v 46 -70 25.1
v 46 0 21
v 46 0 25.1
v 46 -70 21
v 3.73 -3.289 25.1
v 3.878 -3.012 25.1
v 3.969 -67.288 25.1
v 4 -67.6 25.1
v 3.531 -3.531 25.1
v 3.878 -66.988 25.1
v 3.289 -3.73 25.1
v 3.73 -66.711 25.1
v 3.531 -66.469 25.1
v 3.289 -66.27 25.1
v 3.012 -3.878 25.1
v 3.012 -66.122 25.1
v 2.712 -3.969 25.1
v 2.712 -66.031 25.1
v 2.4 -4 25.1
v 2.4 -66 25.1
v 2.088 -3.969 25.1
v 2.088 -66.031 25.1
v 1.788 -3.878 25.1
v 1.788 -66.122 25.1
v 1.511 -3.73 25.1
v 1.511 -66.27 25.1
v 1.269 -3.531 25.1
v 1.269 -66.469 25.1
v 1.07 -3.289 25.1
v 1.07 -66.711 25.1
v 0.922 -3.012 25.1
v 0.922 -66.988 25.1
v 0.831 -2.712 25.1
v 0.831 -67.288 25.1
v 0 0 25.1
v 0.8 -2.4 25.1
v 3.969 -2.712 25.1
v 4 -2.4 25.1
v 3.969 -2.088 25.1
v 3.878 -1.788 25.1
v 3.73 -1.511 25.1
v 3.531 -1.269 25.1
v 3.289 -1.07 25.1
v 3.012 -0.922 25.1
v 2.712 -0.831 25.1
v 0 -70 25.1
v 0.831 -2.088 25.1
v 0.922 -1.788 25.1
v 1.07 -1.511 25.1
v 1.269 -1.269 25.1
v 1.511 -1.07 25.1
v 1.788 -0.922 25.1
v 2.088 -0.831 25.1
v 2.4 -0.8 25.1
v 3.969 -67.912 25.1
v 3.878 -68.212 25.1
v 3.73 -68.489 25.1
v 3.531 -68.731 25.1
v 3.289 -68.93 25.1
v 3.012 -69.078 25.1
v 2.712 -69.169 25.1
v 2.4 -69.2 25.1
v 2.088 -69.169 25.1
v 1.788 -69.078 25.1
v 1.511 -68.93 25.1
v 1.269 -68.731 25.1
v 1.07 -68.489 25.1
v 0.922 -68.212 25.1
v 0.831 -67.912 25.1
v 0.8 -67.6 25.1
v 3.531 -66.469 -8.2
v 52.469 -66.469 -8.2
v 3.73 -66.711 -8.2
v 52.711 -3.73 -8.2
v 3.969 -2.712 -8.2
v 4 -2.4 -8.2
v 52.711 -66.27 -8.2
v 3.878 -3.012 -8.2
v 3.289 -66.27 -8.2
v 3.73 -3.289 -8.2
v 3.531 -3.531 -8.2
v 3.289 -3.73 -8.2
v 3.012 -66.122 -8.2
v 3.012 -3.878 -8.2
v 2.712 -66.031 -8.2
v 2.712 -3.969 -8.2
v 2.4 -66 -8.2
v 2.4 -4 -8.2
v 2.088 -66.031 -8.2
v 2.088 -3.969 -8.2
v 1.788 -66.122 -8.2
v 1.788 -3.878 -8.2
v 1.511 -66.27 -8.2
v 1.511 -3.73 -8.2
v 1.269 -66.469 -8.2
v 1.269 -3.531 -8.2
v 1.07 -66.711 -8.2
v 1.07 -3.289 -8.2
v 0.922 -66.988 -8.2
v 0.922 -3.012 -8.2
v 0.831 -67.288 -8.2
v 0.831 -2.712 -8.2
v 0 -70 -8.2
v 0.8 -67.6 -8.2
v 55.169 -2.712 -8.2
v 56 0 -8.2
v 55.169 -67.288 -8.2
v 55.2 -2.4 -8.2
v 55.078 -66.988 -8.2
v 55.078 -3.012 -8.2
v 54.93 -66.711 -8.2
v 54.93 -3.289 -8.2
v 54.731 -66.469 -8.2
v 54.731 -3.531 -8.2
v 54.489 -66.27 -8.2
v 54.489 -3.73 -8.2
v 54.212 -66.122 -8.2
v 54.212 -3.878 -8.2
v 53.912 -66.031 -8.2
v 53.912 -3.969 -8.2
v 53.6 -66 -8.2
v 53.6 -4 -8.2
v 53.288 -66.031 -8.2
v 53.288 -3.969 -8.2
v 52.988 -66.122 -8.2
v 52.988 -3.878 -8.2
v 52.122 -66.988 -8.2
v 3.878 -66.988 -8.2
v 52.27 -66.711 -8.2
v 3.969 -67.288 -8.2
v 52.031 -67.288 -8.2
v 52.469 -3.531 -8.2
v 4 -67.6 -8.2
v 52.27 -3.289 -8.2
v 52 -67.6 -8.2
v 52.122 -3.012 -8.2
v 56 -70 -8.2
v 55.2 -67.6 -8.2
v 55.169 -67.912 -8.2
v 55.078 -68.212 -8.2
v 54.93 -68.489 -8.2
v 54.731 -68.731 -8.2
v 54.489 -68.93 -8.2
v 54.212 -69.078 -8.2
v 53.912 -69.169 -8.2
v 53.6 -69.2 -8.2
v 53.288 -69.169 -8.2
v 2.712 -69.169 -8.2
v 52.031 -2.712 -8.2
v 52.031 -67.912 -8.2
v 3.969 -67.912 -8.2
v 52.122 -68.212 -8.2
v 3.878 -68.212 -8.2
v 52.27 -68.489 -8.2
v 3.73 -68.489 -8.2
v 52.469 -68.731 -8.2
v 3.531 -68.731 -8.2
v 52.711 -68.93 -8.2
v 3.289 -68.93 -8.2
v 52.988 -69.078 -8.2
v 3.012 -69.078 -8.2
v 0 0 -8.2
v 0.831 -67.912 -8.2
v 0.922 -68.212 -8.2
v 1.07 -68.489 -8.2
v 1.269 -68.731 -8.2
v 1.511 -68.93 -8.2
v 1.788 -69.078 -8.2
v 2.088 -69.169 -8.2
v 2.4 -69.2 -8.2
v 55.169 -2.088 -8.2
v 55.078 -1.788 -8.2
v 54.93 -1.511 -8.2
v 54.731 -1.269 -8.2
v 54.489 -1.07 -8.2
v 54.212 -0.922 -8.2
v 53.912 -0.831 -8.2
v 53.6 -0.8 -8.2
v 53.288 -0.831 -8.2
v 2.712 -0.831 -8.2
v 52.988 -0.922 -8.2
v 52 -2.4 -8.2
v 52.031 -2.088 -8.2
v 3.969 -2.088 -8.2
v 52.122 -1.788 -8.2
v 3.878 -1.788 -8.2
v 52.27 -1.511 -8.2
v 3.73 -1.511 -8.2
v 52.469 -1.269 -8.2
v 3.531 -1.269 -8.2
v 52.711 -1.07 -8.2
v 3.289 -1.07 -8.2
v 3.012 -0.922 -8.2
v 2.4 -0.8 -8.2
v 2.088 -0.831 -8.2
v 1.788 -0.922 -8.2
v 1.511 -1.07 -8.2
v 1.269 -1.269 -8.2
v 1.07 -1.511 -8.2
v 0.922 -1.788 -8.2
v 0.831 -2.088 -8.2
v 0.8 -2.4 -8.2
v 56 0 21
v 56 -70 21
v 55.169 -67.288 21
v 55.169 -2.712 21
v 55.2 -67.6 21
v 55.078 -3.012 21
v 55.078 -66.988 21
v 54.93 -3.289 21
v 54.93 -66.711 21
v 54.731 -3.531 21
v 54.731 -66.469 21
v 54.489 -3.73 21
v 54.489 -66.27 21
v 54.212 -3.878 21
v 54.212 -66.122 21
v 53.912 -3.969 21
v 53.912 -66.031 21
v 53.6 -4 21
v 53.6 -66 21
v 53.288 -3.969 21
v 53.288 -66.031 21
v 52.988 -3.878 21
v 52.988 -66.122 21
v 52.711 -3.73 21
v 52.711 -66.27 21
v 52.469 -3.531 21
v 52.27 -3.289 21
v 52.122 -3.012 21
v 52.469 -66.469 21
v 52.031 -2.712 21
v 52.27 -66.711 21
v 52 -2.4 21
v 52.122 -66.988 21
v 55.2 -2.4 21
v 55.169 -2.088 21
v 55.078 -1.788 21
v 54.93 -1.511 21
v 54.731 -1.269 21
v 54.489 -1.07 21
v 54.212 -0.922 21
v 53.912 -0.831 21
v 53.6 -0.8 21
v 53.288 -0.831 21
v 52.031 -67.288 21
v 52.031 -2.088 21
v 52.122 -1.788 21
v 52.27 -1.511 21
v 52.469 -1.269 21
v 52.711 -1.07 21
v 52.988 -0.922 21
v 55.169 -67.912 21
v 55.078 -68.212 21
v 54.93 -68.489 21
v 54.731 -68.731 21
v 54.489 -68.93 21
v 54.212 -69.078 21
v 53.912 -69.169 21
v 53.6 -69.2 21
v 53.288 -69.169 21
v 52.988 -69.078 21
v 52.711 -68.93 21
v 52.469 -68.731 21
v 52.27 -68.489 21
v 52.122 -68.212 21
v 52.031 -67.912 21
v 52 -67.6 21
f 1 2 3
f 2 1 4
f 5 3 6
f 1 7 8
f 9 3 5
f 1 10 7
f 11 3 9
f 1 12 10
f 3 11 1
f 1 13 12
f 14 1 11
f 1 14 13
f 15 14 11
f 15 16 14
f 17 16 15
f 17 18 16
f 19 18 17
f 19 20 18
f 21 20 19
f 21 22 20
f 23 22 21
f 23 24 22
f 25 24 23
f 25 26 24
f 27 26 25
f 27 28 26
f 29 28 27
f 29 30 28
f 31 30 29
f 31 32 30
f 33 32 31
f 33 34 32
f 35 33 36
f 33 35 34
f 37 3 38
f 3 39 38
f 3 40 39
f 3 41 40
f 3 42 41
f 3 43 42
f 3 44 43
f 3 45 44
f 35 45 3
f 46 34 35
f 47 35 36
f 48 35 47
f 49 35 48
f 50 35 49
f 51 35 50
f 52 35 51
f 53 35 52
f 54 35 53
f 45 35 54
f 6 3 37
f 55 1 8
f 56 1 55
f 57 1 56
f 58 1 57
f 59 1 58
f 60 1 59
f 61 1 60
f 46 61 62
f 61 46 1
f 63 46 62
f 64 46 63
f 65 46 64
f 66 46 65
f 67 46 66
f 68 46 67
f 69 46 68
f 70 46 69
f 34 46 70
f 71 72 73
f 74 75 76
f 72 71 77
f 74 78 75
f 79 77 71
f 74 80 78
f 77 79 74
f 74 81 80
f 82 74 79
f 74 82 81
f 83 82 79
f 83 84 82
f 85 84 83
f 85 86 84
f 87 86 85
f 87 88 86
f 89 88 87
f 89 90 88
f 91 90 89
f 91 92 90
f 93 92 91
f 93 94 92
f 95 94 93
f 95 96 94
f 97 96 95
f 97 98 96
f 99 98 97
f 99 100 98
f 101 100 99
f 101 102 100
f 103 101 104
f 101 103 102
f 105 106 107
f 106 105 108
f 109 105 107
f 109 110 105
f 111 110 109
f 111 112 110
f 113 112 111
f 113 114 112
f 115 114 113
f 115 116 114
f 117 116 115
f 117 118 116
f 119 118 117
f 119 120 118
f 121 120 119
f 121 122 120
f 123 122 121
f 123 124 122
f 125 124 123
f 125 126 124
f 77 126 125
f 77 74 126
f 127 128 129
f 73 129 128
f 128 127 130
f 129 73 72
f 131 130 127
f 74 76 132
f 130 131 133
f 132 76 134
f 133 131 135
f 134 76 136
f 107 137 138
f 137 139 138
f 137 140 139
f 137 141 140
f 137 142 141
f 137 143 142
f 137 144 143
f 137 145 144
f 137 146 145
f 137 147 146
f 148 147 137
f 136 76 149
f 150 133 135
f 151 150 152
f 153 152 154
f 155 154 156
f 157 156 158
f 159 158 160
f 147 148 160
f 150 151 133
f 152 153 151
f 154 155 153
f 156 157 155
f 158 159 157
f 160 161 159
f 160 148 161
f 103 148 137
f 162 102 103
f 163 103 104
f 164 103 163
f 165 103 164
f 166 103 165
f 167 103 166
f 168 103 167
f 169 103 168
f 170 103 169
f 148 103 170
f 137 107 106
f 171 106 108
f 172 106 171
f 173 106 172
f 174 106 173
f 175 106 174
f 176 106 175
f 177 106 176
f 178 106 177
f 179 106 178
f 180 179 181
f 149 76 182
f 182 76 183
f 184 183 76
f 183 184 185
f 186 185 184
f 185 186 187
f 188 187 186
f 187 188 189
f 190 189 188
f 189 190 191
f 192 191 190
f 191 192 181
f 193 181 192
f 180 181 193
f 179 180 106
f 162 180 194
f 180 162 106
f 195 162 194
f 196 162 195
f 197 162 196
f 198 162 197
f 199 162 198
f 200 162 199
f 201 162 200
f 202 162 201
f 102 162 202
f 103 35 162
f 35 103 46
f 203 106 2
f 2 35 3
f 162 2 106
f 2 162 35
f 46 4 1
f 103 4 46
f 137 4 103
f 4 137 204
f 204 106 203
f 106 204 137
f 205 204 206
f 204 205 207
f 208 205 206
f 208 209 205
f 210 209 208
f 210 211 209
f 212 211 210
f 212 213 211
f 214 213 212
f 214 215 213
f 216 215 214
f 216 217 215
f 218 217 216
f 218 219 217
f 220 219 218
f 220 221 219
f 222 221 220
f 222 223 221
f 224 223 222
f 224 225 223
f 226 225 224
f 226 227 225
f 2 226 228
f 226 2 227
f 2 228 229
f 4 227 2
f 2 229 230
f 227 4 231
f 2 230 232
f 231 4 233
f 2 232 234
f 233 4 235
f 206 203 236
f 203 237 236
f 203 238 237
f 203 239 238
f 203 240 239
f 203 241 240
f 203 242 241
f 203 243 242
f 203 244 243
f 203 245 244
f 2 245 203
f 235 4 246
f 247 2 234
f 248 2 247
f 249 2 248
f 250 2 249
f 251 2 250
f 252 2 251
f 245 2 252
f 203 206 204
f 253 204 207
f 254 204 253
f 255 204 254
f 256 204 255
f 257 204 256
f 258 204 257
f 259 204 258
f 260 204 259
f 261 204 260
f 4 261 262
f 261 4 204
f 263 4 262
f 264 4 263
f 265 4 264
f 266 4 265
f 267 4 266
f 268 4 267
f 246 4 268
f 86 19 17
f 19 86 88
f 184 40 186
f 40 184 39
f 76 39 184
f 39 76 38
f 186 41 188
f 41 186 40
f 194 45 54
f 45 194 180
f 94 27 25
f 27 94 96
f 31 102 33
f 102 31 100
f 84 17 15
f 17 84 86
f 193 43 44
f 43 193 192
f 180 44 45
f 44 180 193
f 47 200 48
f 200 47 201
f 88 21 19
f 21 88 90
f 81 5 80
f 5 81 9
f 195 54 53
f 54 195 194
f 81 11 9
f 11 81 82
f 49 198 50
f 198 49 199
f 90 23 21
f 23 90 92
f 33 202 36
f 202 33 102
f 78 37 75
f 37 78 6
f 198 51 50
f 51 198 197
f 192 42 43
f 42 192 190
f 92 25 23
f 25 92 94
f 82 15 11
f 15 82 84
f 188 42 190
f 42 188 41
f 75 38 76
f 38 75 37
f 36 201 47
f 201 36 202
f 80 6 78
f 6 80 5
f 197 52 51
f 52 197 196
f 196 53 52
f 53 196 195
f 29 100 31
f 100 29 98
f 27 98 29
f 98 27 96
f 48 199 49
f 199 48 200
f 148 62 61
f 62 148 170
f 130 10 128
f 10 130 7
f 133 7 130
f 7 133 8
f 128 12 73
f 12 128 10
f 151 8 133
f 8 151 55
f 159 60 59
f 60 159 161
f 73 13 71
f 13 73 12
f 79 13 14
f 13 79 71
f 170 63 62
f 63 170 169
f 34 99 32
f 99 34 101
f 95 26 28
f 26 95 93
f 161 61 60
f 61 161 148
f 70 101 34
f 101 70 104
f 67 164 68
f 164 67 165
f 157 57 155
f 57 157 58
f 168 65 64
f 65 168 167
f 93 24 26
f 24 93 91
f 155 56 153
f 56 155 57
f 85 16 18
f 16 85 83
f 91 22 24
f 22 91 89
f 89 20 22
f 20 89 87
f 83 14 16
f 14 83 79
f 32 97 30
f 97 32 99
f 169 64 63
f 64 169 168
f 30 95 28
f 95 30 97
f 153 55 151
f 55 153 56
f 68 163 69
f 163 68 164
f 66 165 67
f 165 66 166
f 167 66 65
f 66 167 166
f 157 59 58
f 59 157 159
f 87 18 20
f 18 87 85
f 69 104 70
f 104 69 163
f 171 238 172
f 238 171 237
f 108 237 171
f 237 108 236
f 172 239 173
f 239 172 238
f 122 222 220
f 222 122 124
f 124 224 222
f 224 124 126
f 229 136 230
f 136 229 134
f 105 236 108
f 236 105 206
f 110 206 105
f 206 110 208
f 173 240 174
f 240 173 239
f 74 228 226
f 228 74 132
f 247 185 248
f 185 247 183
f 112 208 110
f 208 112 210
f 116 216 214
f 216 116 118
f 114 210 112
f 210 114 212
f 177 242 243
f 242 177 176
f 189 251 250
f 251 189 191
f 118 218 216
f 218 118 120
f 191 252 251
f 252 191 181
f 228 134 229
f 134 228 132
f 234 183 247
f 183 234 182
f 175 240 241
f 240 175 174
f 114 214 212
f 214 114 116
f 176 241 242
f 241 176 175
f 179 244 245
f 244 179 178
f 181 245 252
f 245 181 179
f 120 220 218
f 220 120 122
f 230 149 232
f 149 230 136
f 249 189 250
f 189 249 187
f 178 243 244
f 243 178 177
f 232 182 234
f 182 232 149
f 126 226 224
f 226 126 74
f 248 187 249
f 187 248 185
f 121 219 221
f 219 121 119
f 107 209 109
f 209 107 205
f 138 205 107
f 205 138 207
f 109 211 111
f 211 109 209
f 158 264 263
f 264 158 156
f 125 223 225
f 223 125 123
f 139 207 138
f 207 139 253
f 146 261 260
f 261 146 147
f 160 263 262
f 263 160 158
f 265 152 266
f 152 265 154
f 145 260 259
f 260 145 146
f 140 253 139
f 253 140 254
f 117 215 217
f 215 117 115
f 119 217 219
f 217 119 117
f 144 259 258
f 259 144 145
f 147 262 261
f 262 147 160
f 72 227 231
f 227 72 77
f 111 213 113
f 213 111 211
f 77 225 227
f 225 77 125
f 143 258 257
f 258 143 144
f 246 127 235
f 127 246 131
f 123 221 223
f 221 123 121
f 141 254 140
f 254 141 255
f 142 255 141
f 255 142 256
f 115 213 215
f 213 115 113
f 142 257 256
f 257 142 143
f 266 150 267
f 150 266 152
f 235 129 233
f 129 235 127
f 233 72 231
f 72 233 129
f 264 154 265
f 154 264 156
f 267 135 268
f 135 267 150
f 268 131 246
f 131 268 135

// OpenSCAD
// =====================================================================
// child_pwr_budget.scad — CHILD_PWR (縮小版) に許される外形の「予算」
//
// **基板ではない。機体側から KiCad 側へ返す外形制約そのもの。**
// 200mm チューブの縦置き内装 (A案: CHILD_PWR を縮小する) で、
// CHILD_PWR が占めてよい空間の上限を立体にしたもの。
// この中に収まる基板を KiCad で設計すれば、機体側の変更なしで収まる。
//
// 根拠は docs/子機内装_収まり検討.md §4。現行 CHILD_PWR は 100.35 x 70 で、
// 幅広部 (Ø101.6 / 軸方向 160mm) に CHILD_MAIN (112) と並べて入らない。
//
// 段付きになっているのは、基板の**先端 10mm が上フランジの貫通口 (Ø88.5) へ
// はみ出す**ため。そこだけ低背にする必要がある。
//
// 座標は他の基板モデルと同じ並び:
//   X = 0..56  … 軸方向 (チューブ Z 方向へ写る)。X=0 が下 (CHILD_MAIN 側)
//   Y = -70..0 … 幅方向 (機体 X 方向へ写る)
//   Z          … 高さ。基板下面が Z=0、部品が +Z、裏面リードが -Z
//
// 印刷対象ではない (確認用モデル)。
// =====================================================================

/* [外形の予算] */
pwr_l      = 56;      // 軸方向の長さ (上限)
pwr_w      = 70;      // 幅 (現行と同じ。これ以上広げられない)
pcb_t      = 1.6;

/* [高さの予算 (基板下面から)] */
wide_l     = 46;      // X=0..46 は幅広部 (Ø101.6) の中 → 高さに余裕がある
wide_h     = 25.1;    // その範囲の最大部品高さ (現行 CHILD_PWR と同じ = 変更不要)
tip_h      = 21.0;    // X=46..56 は貫通口 (Ø88.5) の中 → ここだけ低背にすること
under_h    = 8.2;     // 裏面リードの突出 (現行と同じ)

/* [取付穴 (四隅 inset)] */
hole_in    = 2.4;     // 基板端からの inset
hole_d     = 3.2;     // M3 クリアランス

$fn = 32;

// ---- 導出 -------------------------------------------------------------
tip_l  = pwr_l - wide_l;
hx     = [hole_in, pwr_l - hole_in];              // 取付穴 X
hy     = [-hole_in, -(pwr_w - hole_in)];          // 取付穴 Y
pitch_x = hx[1] - hx[0];
pitch_y = abs(hy[1] - hy[0]);

// ---- 成立性チェック ---------------------------------------------------
assert(tip_l > 0, str("wide_l ", wide_l, " が pwr_l ", pwr_l, " 以上"));
assert(tip_h < wide_h, "先端側の高さ予算が幅広部側より大きい — 段の意味がない");
assert(hole_in * 2 < pwr_w && hole_in * 2 < pwr_l, "取付穴の inset が外形より大きい");
// 取付穴は幅広部側/先端側の両方の端に来るので、段の境界にかからないこと
for (x = hx) assert(abs(x - wide_l) > hole_d, "取付穴が高さの段の境界にかかっている");

// ---- 本体 -------------------------------------------------------------
difference() {
    union() {
        // 幅広部にある範囲
        translate([0, -pwr_w, -under_h]) cube([wide_l, pwr_w, under_h + wide_h]);
        // 貫通口へ出る先端 (低背)
        translate([wide_l, -pwr_w, -under_h]) cube([tip_l, pwr_w, under_h + tip_h]);
    }
    // 取付穴 (位置の確認用に貫通させる)
    for (x = hx) for (y = hy)
        translate([x, y, -under_h - 1]) cylinder(d = hole_d, h = under_h + wide_h + 2);
}

echo(str("child_pwr_budget: ", pwr_l, " x ", pwr_w,
         "  面積 ", pwr_l * pwr_w, " mm^2 (現行 CHILD_PWR は ", 100.35 * 70, ")",
         "  高さ 0..", wide_l, " → ", wide_h, " / ", wide_l, "..", pwr_l, " → ", tip_h,
         "  裏面 ", under_h,
         "  取付穴ピッチ ", pitch_x, " x ", pitch_y));
